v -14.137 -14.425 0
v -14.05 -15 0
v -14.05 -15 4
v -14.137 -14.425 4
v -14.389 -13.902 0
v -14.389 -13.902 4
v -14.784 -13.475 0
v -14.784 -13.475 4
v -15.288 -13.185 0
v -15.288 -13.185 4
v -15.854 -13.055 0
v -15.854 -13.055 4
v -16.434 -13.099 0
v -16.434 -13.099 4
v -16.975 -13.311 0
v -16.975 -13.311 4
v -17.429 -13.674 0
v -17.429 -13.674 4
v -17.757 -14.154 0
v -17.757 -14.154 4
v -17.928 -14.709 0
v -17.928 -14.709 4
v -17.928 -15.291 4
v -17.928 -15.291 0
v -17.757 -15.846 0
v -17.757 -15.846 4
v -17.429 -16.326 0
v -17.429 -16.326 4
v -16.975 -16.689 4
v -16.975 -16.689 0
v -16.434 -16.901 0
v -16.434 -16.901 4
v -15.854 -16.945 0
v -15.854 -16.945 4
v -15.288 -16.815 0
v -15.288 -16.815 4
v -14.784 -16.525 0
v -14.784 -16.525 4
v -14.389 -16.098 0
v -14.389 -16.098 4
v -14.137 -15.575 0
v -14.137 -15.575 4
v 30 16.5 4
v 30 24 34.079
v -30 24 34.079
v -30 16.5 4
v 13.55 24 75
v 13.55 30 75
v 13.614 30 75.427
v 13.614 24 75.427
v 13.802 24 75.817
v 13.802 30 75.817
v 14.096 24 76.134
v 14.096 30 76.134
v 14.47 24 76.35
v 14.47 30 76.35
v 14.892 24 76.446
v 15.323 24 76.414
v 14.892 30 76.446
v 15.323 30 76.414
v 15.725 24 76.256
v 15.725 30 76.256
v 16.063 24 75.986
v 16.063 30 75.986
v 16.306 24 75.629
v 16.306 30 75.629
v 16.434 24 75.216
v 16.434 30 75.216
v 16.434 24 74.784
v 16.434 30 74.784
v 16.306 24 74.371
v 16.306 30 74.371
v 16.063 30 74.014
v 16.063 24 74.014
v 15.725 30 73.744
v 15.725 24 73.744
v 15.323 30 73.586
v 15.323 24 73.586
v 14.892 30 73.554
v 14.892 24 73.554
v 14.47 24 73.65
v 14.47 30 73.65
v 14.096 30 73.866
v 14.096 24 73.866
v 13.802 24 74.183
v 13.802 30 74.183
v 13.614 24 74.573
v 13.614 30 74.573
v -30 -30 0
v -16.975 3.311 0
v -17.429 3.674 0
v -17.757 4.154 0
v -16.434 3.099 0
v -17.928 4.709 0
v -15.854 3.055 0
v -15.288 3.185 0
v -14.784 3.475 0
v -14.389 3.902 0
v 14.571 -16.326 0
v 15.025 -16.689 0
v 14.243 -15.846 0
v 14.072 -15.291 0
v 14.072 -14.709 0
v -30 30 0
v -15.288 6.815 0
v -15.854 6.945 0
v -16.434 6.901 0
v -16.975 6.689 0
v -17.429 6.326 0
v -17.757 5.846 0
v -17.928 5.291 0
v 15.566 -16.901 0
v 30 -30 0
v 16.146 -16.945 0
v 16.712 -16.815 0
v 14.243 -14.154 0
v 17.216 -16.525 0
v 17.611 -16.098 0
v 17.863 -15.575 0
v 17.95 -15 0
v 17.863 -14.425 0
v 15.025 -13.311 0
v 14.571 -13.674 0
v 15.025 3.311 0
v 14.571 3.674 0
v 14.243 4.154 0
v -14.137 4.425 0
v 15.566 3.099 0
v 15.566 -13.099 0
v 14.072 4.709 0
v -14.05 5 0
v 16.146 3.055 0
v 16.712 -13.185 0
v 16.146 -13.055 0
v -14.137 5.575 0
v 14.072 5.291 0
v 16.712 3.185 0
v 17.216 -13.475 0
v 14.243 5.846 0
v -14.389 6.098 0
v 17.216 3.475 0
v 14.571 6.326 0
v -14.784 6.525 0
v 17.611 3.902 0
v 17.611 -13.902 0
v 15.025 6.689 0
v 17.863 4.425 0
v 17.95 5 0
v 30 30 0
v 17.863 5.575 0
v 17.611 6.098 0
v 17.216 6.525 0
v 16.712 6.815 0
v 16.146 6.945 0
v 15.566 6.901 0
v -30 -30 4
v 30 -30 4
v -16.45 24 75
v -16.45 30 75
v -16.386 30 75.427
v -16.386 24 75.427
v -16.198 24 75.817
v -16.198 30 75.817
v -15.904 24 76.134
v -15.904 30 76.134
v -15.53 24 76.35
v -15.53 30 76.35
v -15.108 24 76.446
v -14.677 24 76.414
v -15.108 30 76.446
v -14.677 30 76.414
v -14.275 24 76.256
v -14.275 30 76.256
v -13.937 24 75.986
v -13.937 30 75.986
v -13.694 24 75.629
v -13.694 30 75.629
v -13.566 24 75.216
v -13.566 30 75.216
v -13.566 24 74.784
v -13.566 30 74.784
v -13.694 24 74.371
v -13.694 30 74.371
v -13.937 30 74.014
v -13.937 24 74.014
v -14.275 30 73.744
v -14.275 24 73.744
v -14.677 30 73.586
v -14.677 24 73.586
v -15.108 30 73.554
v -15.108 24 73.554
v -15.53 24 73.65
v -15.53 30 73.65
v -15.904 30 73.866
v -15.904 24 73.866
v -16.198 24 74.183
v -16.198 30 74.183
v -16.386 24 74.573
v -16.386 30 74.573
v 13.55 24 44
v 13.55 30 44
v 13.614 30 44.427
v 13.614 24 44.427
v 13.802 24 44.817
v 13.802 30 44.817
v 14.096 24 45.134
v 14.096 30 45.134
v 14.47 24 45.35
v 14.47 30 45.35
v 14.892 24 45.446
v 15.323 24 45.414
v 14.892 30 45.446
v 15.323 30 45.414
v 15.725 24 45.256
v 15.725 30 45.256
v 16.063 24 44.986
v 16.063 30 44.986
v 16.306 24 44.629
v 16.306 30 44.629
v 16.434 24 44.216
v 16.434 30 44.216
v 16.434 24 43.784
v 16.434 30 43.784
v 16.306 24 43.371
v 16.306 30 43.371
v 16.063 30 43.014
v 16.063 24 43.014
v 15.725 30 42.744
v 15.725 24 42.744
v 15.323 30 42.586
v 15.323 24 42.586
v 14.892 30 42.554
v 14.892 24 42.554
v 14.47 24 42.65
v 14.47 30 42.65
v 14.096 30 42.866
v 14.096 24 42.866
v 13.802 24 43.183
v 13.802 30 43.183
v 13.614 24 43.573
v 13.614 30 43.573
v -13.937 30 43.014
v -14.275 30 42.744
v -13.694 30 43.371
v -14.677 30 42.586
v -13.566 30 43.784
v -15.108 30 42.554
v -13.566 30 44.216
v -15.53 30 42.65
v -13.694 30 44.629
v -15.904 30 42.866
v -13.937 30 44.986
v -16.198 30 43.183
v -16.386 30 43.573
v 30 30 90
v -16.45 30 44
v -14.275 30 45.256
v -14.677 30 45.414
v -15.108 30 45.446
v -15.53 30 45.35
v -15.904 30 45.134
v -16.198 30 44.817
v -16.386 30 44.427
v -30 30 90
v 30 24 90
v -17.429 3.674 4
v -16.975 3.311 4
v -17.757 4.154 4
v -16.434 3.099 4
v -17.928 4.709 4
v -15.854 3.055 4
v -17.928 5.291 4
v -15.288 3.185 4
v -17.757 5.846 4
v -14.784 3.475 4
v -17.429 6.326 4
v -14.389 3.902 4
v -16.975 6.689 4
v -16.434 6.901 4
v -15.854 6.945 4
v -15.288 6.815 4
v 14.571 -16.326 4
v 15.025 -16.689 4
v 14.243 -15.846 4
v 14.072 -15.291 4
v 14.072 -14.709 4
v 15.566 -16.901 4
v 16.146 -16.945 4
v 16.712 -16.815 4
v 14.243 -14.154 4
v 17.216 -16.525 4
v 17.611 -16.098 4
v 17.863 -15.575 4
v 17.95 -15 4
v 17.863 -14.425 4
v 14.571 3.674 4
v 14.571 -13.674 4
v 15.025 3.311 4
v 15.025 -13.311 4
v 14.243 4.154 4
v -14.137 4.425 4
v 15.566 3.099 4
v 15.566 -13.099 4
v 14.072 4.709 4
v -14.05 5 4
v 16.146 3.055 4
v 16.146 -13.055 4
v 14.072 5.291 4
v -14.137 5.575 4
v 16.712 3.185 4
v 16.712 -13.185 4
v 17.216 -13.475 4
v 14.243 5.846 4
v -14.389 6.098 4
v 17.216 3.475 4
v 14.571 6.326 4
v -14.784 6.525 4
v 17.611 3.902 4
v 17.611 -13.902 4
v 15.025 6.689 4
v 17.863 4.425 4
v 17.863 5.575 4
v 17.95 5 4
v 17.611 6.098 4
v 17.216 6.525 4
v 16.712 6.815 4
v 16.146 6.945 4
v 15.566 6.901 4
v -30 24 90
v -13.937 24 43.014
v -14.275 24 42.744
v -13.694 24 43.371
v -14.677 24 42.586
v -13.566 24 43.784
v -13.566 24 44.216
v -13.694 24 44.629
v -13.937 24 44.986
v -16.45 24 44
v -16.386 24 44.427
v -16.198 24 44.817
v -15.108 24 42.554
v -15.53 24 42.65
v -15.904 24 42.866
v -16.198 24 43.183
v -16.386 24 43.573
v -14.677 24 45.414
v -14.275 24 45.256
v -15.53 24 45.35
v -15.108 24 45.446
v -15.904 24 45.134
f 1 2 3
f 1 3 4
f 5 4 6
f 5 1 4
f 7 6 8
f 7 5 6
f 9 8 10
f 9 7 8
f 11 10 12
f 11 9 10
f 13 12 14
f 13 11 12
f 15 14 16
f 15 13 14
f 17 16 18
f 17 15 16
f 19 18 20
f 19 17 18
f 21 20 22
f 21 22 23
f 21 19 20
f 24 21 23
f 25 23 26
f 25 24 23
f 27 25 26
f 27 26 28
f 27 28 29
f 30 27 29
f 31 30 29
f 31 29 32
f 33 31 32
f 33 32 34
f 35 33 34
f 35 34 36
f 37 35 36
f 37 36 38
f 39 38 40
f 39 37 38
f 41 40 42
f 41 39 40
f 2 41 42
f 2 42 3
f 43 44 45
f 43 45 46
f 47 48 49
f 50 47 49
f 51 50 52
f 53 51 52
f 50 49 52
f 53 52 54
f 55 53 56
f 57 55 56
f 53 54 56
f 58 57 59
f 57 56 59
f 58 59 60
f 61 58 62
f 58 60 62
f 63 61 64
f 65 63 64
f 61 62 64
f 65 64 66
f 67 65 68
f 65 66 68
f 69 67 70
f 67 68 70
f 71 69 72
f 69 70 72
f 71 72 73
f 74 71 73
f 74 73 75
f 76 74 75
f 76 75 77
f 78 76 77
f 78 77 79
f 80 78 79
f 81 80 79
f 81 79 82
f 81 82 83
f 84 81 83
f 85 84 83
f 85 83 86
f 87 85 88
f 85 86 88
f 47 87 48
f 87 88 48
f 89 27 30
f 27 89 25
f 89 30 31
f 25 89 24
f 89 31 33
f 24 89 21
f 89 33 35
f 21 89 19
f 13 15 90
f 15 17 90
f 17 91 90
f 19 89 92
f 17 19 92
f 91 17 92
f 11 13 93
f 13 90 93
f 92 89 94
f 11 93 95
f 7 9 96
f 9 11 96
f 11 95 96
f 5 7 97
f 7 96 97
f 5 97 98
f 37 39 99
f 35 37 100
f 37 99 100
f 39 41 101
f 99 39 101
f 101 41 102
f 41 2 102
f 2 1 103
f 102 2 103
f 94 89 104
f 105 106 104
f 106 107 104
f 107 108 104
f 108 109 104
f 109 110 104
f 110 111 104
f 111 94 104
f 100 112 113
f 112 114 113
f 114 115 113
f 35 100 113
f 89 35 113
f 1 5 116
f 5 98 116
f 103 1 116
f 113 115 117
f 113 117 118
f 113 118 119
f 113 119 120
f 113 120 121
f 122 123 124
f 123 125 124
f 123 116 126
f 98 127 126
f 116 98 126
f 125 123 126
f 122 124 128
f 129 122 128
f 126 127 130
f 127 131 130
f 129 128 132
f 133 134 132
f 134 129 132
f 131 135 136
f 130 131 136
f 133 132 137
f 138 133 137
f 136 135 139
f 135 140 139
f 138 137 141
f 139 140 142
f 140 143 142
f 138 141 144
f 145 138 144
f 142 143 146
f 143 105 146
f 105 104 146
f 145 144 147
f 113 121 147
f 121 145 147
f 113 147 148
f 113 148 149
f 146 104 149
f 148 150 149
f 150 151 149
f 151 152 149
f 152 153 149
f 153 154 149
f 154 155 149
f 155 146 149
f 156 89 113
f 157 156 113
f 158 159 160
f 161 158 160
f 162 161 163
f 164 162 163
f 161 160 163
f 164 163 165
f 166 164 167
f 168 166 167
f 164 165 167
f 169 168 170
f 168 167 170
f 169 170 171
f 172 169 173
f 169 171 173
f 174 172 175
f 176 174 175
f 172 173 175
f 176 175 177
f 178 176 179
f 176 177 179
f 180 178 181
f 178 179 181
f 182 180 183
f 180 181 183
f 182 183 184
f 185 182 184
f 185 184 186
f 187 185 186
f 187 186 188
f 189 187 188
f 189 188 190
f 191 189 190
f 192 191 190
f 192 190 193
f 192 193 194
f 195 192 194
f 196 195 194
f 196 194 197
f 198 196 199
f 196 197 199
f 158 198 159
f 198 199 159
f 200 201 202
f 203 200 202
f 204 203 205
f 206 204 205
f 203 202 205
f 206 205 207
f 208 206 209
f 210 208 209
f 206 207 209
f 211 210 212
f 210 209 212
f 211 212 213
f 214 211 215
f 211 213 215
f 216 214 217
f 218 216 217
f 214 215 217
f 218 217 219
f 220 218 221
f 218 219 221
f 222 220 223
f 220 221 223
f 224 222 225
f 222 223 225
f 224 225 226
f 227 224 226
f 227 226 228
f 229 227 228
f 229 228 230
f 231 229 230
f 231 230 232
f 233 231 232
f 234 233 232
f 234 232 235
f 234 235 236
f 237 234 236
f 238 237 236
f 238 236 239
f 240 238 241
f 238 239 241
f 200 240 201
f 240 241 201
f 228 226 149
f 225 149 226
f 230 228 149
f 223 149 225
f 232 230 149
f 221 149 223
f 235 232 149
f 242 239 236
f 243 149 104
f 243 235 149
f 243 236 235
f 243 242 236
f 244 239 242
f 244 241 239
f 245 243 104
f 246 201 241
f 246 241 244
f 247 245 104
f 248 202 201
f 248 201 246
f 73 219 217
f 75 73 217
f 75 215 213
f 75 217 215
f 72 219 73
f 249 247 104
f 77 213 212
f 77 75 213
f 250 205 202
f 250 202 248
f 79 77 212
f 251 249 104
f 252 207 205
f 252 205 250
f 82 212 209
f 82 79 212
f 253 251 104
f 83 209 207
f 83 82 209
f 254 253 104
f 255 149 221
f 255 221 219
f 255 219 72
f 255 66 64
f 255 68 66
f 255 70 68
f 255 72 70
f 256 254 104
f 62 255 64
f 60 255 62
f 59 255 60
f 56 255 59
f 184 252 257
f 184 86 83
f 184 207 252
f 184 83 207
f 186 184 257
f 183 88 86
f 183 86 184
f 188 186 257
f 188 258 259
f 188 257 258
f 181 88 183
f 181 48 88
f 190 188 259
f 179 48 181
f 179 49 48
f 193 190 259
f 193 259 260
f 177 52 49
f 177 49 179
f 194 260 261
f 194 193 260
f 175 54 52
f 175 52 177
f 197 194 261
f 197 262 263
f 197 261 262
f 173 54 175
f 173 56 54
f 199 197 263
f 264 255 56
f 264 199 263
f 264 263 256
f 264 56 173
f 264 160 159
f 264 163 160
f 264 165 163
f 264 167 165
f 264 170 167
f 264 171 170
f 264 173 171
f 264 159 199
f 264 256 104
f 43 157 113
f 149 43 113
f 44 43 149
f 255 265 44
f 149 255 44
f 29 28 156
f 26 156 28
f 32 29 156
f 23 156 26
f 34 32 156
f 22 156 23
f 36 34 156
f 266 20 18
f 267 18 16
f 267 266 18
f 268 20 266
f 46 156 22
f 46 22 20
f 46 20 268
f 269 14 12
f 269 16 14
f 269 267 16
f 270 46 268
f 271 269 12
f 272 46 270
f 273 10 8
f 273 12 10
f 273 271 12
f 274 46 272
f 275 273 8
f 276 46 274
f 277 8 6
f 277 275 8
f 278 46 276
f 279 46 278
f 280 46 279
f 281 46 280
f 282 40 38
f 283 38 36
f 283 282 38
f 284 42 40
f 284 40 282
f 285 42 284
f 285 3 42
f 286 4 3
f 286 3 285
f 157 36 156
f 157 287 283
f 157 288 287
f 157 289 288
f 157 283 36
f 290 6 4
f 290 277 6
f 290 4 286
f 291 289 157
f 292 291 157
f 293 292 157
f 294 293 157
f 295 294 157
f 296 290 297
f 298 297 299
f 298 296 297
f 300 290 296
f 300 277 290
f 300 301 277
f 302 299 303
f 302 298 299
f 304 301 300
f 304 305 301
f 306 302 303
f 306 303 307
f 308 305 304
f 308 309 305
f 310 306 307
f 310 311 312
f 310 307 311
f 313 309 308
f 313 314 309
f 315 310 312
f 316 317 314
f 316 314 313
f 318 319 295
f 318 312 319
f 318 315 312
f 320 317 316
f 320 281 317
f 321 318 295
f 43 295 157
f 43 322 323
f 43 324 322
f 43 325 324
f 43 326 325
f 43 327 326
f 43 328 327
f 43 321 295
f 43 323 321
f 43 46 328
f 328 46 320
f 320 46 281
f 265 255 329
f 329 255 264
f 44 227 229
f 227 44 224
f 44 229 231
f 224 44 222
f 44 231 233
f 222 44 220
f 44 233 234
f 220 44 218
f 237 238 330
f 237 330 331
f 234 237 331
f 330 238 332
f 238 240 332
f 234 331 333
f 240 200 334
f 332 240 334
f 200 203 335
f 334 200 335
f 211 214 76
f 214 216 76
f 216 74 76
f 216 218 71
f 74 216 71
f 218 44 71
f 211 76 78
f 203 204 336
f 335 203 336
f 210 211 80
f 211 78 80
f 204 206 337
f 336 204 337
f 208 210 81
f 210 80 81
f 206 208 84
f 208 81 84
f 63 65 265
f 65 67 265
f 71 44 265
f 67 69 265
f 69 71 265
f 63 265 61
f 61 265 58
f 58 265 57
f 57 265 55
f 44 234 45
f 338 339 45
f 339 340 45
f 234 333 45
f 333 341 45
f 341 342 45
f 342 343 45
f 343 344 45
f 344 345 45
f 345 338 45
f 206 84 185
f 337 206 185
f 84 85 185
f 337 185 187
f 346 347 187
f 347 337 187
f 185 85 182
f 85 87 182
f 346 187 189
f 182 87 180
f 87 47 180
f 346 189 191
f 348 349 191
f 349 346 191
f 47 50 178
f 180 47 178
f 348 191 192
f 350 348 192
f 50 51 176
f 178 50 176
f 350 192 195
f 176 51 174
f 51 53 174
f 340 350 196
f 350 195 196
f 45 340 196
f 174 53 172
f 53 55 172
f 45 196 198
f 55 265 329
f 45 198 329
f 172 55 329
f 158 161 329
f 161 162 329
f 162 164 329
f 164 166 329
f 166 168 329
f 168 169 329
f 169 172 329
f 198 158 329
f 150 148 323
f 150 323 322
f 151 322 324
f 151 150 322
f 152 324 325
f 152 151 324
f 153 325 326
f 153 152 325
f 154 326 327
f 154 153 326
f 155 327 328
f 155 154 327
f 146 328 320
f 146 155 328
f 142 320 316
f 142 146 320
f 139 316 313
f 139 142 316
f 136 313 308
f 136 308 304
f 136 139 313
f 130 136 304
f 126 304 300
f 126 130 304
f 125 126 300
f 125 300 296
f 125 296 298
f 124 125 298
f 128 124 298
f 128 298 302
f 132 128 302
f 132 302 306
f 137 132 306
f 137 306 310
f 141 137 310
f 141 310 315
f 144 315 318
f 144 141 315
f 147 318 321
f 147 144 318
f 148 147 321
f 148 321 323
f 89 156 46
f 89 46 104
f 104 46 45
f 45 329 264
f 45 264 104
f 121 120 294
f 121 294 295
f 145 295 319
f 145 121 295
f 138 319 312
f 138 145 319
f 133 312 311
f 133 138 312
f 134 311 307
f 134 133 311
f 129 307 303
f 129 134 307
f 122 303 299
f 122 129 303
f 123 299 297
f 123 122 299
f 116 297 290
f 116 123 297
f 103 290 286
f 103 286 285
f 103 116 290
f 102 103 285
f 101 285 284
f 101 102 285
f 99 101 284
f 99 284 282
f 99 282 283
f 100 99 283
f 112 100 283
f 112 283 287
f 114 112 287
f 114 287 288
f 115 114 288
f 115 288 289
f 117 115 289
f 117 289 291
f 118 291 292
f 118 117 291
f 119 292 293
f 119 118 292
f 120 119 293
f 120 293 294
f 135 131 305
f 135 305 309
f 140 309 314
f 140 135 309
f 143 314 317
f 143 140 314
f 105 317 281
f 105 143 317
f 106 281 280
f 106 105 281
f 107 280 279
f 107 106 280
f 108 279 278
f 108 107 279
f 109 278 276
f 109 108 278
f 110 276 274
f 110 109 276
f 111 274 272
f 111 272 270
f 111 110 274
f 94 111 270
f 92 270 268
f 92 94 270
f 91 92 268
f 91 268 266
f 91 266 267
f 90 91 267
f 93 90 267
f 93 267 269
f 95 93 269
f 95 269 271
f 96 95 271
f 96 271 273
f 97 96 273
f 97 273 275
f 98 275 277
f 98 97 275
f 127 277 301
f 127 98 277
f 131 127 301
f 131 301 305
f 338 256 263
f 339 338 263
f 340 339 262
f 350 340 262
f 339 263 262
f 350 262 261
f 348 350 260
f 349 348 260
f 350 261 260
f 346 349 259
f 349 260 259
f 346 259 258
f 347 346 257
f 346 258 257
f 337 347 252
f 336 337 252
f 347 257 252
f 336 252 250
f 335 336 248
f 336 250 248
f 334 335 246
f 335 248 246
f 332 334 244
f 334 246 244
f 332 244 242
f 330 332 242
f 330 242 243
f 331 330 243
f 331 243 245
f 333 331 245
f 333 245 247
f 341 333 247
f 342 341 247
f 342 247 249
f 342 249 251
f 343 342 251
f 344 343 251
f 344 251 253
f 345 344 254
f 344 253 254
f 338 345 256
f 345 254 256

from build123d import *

# Parameters (mm, degrees)
F0_W     = 60
F0_H     = 60
F0_R     = 1.95
F1_DEPTH = 4
F2_W     = 60
F2_H     = 86
F2_R     = 1.45
F3_DEPTH = 6
F5_DEPTH = 60


with BuildPart() as f1:
    # F0 (on Top) → F1 (new body)
    with BuildSketch(Plane.XY):
        Rectangle(F0_W, F0_H)
        with Locations((-16, -15)):
            Circle(F0_R, mode=Mode.SUBTRACT)
        with Locations((16, -15)):
            Circle(F0_R, mode=Mode.SUBTRACT)
        with Locations((-16, 5)):
            Circle(F0_R, mode=Mode.SUBTRACT)
        with Locations((16, 5)):
            Circle(F0_R, mode=Mode.SUBTRACT)
    extrude(amount=F1_DEPTH)

    # F2 (on face) → F3 (join)
    with BuildSketch(Plane(origin=(0, 30, 0), x_dir=(-1, 0, 0), z_dir=(0, 1, 0))):
        with Locations((0, 47)):
            Rectangle(F2_W, F2_H)
        with Locations((-15, 44)):
            Circle(F2_R, mode=Mode.SUBTRACT)
        with Locations((15, 44)):
            Circle(F2_R, mode=Mode.SUBTRACT)
        with Locations((-15, 75)):
            Circle(F2_R, mode=Mode.SUBTRACT)
        with Locations((15, 75)):
            Circle(F2_R, mode=Mode.SUBTRACT)
    extrude(amount=-F3_DEPTH)

    # F4 (on face) → F5 (join)
    with BuildSketch(Plane.YZ.offset(30)):
        Polygon((24, 34.079062), (16.5, 4), (24, 4), align=None)
    extrude(amount=-F5_DEPTH)


solid = f1.part
